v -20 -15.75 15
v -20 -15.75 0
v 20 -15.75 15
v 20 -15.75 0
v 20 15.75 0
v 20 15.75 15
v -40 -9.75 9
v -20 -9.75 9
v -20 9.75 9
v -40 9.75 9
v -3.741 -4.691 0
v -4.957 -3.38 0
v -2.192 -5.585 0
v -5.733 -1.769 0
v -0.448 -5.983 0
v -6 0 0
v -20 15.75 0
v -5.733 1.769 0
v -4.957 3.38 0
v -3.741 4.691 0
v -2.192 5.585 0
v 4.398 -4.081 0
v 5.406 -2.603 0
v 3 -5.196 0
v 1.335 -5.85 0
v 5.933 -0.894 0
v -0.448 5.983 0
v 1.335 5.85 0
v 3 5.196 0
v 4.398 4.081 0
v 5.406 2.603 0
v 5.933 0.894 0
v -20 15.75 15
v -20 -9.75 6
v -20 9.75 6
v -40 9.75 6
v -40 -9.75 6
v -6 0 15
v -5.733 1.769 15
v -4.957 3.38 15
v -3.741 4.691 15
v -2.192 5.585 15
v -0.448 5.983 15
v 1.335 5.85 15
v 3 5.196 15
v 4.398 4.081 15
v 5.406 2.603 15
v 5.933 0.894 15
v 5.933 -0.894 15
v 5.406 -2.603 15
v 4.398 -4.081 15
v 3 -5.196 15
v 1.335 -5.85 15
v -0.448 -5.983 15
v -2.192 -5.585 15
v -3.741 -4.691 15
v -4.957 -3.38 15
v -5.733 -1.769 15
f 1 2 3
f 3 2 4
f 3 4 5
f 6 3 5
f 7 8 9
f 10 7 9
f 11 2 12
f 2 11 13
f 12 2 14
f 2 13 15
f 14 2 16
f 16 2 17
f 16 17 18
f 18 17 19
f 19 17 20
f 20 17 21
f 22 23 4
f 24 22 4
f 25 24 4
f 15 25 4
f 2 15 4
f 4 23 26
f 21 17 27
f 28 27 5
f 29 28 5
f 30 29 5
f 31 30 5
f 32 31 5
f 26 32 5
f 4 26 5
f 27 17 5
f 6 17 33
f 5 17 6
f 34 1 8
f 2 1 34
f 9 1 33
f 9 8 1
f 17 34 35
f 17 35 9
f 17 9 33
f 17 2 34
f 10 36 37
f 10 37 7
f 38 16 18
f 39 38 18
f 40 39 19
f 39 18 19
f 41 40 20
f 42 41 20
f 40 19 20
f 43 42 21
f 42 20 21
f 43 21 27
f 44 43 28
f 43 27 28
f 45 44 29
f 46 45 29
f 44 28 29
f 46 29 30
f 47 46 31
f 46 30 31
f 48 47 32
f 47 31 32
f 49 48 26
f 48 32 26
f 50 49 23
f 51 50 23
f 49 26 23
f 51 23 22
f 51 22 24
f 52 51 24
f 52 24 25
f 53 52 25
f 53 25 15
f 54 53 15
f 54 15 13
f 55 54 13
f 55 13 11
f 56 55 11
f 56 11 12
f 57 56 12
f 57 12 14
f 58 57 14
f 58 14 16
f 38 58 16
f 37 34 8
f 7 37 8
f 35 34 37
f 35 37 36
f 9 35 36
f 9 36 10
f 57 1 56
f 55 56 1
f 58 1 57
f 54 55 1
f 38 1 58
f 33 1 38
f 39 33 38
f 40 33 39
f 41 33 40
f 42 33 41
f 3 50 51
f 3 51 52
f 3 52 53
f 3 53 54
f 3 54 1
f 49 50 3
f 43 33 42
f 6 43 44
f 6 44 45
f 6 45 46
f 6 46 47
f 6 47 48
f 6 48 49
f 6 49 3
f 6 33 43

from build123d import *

# Parameters (mm, degrees)
SKETCH1_W           = 40
SKETCH1_H           = 31.5
BOSS_EXTRUDE1_DEPTH = 15
SKETCH2_W           = 3
SKETCH2_H           = 19.5
BOSS_EXTRUDE2_DEPTH = 20
SKETCH3_R           = 6
CUT_EXTRUDE1_DEPTH  = 46.530896104


with BuildPart() as part:
    # Sketch1 → Boss-Extrude1 (new body)
    with BuildSketch(Plane.XY):
        Rectangle(SKETCH1_W, SKETCH1_H)
    extrude(amount=BOSS_EXTRUDE1_DEPTH)

    # Sketch2 → Boss-Extrude2 (add)
    with BuildSketch(Plane.ZY.offset(20)):
        with Locations((7.5, 0)):
            Rectangle(SKETCH2_W, SKETCH2_H)
    extrude(amount=BOSS_EXTRUDE2_DEPTH)

    # Sketch3 → Cut-Extrude1 (cut, through all)
    with BuildSketch(Plane(origin=(0, 0, 0), x_dir=(-1, 0, 0), z_dir=(0, 0, -1))):
        Circle(SKETCH3_R)
    extrude(amount=-CUT_EXTRUDE1_DEPTH, mode=Mode.SUBTRACT)


solid = part.part
